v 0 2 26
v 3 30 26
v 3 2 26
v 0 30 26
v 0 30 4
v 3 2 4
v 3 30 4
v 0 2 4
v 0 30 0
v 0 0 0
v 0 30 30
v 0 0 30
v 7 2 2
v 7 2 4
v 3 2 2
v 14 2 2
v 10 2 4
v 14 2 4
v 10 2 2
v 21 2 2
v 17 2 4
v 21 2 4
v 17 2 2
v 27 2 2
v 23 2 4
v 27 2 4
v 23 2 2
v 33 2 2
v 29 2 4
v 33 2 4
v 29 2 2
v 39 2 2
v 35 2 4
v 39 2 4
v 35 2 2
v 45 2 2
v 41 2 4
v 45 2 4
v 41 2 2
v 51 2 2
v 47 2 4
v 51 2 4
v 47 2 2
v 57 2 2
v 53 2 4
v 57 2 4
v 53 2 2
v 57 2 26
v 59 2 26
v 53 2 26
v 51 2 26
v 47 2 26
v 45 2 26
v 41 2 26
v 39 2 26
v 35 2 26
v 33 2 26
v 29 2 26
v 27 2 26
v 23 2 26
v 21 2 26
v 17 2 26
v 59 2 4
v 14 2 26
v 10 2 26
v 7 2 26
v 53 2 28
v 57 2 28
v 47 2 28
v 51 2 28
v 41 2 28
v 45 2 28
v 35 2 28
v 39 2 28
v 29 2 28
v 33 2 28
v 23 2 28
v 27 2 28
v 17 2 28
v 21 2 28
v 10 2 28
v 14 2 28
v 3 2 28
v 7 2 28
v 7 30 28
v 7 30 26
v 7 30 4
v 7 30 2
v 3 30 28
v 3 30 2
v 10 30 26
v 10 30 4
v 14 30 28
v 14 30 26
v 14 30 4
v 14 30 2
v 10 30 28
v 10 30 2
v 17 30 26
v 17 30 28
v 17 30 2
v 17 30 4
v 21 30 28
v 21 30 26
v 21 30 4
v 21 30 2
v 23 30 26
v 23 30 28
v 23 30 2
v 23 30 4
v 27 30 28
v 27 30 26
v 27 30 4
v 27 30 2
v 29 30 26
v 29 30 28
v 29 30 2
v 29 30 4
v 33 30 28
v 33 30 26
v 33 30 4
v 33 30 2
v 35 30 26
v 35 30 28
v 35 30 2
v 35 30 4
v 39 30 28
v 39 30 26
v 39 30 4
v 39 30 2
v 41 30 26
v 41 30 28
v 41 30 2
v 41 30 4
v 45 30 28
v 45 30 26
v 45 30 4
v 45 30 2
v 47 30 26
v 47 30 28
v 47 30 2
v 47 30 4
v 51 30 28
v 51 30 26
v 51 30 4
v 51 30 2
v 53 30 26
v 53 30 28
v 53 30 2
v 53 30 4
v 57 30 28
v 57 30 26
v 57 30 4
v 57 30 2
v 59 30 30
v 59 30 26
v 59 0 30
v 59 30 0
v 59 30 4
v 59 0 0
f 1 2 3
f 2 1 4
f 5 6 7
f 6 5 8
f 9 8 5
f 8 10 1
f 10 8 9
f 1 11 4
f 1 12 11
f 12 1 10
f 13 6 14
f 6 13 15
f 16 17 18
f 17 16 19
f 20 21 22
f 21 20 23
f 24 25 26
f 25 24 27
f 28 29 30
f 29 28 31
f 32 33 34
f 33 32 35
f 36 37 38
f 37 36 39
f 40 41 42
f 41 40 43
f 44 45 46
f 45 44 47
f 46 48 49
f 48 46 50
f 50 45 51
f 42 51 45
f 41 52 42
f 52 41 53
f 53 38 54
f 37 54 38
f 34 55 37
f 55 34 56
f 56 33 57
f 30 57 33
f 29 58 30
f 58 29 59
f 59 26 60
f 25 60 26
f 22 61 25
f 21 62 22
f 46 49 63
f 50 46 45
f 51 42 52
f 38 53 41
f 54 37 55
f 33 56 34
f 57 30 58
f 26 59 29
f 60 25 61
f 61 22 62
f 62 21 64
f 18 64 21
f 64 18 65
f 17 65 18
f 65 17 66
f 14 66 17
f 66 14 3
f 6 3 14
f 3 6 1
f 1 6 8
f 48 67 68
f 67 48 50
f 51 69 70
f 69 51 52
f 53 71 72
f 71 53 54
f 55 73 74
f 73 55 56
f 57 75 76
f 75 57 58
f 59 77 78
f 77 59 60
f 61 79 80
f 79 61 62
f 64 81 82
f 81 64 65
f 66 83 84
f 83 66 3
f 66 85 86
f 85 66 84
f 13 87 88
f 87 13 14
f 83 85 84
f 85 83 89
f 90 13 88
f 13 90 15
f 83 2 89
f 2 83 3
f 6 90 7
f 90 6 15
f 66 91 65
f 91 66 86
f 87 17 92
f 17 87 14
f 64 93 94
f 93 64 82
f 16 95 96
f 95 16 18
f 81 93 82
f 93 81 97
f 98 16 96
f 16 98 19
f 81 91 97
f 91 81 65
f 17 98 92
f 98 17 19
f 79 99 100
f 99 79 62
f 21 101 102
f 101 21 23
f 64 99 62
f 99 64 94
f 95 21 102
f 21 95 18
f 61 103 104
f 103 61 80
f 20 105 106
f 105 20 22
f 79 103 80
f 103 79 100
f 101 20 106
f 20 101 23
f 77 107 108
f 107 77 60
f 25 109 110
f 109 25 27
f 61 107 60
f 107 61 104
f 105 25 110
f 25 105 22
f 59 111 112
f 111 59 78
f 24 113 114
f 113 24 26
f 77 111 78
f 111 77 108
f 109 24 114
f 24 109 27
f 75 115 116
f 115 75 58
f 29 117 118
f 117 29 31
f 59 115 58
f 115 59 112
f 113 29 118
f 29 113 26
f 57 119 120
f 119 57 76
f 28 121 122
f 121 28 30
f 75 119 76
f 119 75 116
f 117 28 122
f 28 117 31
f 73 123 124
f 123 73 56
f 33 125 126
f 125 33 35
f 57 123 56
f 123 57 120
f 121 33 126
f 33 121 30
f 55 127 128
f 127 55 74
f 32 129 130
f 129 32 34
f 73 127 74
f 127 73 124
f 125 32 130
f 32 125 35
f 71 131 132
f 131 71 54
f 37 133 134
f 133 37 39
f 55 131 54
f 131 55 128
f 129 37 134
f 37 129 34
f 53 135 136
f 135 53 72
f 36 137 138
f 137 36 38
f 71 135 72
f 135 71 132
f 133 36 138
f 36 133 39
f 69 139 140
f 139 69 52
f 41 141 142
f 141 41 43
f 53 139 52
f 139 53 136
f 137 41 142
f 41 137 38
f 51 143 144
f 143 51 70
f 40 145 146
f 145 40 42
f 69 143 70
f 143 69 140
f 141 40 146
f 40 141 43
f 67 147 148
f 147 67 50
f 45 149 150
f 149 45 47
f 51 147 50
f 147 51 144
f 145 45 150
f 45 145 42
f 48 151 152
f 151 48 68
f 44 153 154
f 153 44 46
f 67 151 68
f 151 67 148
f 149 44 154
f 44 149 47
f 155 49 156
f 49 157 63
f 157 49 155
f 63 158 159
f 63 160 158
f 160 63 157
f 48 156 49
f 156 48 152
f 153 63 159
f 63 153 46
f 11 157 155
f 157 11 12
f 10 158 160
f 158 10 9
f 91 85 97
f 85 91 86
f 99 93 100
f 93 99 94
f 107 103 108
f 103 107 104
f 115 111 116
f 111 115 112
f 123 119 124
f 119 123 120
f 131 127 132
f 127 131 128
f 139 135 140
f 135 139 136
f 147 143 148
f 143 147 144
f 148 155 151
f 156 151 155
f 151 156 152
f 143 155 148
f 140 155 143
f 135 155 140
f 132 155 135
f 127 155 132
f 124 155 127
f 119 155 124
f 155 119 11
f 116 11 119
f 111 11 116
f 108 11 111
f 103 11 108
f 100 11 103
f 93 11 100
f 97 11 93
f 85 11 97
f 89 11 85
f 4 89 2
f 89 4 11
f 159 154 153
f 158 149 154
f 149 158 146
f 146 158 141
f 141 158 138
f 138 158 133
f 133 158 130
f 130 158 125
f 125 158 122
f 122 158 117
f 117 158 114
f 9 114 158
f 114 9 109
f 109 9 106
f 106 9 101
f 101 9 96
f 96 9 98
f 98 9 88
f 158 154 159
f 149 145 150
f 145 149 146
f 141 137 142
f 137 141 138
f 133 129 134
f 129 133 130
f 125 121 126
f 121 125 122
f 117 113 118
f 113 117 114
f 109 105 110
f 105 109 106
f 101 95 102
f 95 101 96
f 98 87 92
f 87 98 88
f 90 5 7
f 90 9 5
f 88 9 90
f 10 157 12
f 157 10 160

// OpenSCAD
//translate ([0, -31, 0]) import("/Users/cnandi/research/reincarnate/src/ocaml/phase2/infer/benchmarks/finalbenches/sdcardrack/SDcardrack.stl");


difference() {
    scale ([59, 30, 30]) {
        cube();
    }
    
    union (){
        translate ([0, 2, 4]) {
            scale([4, 30, 22]) {
                cube();
            }
        }      
        
        translate ([3, 2, 2]) {
            scale([4, 30, 26]) {
                cube();
            }
        } 
        
        translate ([7, 2, 4]) {
            scale([4, 30, 22]) {
                cube();
            }
        }
 
         translate ([10, 2, 2]) {
            scale([4, 30, 26]) {
                cube();
            }
        } 
        
        
        translate ([13, 2, 4]) {
            scale([4, 30, 22]) {
                cube();
            }
        }
         translate ([17, 2, 2]) {
            scale([4, 30, 26]) {
                cube();
            }
        } 
                
        translate ([19, 2, 4]) {
            scale([4, 30, 22]) {
                cube();
            }
        }     
 
          translate ([23, 2, 2]) {
            scale([4, 30, 26]) {
                cube();
            }
        }
        
        translate ([25, 2, 4]) {
            scale([4, 30, 22]) {
                cube();
            }
        }
 
           translate ([29, 2, 2]) {
            scale([4, 30, 26]) {
                cube();
            }
        }
        
        translate ([31, 2, 4]) {
            scale([4, 30, 22]) {
                cube();
            }
        }

           translate ([35, 2, 2]) {
            scale([4, 30, 26]) {
                cube();
            }
        }
        
        translate ([37, 2, 4]) {
            scale([4, 30, 22]) {
                cube();
            }
        }
        
        translate ([41, 2, 2]) {
            scale([4, 30, 26]) {
                cube();
            }
        }
        
        
        translate ([43, 2, 4]) {
            scale([4, 30, 22]) {
                cube();
            }
        }
 
         translate ([47, 2, 2]) {
            scale([4, 30, 26]) {
                cube();
            }
        }
        
        
        translate ([49, 2, 4]) {
            scale([4, 30, 22]) {
                cube();
            }
        }
   
       translate ([53, 2, 2]) {
            scale([4, 30, 26]) {
                cube();
            }
        }     
        translate ([55, 2, 4]) {
            scale([4, 30, 22]) {
                cube();
            }
        }
    }
}
